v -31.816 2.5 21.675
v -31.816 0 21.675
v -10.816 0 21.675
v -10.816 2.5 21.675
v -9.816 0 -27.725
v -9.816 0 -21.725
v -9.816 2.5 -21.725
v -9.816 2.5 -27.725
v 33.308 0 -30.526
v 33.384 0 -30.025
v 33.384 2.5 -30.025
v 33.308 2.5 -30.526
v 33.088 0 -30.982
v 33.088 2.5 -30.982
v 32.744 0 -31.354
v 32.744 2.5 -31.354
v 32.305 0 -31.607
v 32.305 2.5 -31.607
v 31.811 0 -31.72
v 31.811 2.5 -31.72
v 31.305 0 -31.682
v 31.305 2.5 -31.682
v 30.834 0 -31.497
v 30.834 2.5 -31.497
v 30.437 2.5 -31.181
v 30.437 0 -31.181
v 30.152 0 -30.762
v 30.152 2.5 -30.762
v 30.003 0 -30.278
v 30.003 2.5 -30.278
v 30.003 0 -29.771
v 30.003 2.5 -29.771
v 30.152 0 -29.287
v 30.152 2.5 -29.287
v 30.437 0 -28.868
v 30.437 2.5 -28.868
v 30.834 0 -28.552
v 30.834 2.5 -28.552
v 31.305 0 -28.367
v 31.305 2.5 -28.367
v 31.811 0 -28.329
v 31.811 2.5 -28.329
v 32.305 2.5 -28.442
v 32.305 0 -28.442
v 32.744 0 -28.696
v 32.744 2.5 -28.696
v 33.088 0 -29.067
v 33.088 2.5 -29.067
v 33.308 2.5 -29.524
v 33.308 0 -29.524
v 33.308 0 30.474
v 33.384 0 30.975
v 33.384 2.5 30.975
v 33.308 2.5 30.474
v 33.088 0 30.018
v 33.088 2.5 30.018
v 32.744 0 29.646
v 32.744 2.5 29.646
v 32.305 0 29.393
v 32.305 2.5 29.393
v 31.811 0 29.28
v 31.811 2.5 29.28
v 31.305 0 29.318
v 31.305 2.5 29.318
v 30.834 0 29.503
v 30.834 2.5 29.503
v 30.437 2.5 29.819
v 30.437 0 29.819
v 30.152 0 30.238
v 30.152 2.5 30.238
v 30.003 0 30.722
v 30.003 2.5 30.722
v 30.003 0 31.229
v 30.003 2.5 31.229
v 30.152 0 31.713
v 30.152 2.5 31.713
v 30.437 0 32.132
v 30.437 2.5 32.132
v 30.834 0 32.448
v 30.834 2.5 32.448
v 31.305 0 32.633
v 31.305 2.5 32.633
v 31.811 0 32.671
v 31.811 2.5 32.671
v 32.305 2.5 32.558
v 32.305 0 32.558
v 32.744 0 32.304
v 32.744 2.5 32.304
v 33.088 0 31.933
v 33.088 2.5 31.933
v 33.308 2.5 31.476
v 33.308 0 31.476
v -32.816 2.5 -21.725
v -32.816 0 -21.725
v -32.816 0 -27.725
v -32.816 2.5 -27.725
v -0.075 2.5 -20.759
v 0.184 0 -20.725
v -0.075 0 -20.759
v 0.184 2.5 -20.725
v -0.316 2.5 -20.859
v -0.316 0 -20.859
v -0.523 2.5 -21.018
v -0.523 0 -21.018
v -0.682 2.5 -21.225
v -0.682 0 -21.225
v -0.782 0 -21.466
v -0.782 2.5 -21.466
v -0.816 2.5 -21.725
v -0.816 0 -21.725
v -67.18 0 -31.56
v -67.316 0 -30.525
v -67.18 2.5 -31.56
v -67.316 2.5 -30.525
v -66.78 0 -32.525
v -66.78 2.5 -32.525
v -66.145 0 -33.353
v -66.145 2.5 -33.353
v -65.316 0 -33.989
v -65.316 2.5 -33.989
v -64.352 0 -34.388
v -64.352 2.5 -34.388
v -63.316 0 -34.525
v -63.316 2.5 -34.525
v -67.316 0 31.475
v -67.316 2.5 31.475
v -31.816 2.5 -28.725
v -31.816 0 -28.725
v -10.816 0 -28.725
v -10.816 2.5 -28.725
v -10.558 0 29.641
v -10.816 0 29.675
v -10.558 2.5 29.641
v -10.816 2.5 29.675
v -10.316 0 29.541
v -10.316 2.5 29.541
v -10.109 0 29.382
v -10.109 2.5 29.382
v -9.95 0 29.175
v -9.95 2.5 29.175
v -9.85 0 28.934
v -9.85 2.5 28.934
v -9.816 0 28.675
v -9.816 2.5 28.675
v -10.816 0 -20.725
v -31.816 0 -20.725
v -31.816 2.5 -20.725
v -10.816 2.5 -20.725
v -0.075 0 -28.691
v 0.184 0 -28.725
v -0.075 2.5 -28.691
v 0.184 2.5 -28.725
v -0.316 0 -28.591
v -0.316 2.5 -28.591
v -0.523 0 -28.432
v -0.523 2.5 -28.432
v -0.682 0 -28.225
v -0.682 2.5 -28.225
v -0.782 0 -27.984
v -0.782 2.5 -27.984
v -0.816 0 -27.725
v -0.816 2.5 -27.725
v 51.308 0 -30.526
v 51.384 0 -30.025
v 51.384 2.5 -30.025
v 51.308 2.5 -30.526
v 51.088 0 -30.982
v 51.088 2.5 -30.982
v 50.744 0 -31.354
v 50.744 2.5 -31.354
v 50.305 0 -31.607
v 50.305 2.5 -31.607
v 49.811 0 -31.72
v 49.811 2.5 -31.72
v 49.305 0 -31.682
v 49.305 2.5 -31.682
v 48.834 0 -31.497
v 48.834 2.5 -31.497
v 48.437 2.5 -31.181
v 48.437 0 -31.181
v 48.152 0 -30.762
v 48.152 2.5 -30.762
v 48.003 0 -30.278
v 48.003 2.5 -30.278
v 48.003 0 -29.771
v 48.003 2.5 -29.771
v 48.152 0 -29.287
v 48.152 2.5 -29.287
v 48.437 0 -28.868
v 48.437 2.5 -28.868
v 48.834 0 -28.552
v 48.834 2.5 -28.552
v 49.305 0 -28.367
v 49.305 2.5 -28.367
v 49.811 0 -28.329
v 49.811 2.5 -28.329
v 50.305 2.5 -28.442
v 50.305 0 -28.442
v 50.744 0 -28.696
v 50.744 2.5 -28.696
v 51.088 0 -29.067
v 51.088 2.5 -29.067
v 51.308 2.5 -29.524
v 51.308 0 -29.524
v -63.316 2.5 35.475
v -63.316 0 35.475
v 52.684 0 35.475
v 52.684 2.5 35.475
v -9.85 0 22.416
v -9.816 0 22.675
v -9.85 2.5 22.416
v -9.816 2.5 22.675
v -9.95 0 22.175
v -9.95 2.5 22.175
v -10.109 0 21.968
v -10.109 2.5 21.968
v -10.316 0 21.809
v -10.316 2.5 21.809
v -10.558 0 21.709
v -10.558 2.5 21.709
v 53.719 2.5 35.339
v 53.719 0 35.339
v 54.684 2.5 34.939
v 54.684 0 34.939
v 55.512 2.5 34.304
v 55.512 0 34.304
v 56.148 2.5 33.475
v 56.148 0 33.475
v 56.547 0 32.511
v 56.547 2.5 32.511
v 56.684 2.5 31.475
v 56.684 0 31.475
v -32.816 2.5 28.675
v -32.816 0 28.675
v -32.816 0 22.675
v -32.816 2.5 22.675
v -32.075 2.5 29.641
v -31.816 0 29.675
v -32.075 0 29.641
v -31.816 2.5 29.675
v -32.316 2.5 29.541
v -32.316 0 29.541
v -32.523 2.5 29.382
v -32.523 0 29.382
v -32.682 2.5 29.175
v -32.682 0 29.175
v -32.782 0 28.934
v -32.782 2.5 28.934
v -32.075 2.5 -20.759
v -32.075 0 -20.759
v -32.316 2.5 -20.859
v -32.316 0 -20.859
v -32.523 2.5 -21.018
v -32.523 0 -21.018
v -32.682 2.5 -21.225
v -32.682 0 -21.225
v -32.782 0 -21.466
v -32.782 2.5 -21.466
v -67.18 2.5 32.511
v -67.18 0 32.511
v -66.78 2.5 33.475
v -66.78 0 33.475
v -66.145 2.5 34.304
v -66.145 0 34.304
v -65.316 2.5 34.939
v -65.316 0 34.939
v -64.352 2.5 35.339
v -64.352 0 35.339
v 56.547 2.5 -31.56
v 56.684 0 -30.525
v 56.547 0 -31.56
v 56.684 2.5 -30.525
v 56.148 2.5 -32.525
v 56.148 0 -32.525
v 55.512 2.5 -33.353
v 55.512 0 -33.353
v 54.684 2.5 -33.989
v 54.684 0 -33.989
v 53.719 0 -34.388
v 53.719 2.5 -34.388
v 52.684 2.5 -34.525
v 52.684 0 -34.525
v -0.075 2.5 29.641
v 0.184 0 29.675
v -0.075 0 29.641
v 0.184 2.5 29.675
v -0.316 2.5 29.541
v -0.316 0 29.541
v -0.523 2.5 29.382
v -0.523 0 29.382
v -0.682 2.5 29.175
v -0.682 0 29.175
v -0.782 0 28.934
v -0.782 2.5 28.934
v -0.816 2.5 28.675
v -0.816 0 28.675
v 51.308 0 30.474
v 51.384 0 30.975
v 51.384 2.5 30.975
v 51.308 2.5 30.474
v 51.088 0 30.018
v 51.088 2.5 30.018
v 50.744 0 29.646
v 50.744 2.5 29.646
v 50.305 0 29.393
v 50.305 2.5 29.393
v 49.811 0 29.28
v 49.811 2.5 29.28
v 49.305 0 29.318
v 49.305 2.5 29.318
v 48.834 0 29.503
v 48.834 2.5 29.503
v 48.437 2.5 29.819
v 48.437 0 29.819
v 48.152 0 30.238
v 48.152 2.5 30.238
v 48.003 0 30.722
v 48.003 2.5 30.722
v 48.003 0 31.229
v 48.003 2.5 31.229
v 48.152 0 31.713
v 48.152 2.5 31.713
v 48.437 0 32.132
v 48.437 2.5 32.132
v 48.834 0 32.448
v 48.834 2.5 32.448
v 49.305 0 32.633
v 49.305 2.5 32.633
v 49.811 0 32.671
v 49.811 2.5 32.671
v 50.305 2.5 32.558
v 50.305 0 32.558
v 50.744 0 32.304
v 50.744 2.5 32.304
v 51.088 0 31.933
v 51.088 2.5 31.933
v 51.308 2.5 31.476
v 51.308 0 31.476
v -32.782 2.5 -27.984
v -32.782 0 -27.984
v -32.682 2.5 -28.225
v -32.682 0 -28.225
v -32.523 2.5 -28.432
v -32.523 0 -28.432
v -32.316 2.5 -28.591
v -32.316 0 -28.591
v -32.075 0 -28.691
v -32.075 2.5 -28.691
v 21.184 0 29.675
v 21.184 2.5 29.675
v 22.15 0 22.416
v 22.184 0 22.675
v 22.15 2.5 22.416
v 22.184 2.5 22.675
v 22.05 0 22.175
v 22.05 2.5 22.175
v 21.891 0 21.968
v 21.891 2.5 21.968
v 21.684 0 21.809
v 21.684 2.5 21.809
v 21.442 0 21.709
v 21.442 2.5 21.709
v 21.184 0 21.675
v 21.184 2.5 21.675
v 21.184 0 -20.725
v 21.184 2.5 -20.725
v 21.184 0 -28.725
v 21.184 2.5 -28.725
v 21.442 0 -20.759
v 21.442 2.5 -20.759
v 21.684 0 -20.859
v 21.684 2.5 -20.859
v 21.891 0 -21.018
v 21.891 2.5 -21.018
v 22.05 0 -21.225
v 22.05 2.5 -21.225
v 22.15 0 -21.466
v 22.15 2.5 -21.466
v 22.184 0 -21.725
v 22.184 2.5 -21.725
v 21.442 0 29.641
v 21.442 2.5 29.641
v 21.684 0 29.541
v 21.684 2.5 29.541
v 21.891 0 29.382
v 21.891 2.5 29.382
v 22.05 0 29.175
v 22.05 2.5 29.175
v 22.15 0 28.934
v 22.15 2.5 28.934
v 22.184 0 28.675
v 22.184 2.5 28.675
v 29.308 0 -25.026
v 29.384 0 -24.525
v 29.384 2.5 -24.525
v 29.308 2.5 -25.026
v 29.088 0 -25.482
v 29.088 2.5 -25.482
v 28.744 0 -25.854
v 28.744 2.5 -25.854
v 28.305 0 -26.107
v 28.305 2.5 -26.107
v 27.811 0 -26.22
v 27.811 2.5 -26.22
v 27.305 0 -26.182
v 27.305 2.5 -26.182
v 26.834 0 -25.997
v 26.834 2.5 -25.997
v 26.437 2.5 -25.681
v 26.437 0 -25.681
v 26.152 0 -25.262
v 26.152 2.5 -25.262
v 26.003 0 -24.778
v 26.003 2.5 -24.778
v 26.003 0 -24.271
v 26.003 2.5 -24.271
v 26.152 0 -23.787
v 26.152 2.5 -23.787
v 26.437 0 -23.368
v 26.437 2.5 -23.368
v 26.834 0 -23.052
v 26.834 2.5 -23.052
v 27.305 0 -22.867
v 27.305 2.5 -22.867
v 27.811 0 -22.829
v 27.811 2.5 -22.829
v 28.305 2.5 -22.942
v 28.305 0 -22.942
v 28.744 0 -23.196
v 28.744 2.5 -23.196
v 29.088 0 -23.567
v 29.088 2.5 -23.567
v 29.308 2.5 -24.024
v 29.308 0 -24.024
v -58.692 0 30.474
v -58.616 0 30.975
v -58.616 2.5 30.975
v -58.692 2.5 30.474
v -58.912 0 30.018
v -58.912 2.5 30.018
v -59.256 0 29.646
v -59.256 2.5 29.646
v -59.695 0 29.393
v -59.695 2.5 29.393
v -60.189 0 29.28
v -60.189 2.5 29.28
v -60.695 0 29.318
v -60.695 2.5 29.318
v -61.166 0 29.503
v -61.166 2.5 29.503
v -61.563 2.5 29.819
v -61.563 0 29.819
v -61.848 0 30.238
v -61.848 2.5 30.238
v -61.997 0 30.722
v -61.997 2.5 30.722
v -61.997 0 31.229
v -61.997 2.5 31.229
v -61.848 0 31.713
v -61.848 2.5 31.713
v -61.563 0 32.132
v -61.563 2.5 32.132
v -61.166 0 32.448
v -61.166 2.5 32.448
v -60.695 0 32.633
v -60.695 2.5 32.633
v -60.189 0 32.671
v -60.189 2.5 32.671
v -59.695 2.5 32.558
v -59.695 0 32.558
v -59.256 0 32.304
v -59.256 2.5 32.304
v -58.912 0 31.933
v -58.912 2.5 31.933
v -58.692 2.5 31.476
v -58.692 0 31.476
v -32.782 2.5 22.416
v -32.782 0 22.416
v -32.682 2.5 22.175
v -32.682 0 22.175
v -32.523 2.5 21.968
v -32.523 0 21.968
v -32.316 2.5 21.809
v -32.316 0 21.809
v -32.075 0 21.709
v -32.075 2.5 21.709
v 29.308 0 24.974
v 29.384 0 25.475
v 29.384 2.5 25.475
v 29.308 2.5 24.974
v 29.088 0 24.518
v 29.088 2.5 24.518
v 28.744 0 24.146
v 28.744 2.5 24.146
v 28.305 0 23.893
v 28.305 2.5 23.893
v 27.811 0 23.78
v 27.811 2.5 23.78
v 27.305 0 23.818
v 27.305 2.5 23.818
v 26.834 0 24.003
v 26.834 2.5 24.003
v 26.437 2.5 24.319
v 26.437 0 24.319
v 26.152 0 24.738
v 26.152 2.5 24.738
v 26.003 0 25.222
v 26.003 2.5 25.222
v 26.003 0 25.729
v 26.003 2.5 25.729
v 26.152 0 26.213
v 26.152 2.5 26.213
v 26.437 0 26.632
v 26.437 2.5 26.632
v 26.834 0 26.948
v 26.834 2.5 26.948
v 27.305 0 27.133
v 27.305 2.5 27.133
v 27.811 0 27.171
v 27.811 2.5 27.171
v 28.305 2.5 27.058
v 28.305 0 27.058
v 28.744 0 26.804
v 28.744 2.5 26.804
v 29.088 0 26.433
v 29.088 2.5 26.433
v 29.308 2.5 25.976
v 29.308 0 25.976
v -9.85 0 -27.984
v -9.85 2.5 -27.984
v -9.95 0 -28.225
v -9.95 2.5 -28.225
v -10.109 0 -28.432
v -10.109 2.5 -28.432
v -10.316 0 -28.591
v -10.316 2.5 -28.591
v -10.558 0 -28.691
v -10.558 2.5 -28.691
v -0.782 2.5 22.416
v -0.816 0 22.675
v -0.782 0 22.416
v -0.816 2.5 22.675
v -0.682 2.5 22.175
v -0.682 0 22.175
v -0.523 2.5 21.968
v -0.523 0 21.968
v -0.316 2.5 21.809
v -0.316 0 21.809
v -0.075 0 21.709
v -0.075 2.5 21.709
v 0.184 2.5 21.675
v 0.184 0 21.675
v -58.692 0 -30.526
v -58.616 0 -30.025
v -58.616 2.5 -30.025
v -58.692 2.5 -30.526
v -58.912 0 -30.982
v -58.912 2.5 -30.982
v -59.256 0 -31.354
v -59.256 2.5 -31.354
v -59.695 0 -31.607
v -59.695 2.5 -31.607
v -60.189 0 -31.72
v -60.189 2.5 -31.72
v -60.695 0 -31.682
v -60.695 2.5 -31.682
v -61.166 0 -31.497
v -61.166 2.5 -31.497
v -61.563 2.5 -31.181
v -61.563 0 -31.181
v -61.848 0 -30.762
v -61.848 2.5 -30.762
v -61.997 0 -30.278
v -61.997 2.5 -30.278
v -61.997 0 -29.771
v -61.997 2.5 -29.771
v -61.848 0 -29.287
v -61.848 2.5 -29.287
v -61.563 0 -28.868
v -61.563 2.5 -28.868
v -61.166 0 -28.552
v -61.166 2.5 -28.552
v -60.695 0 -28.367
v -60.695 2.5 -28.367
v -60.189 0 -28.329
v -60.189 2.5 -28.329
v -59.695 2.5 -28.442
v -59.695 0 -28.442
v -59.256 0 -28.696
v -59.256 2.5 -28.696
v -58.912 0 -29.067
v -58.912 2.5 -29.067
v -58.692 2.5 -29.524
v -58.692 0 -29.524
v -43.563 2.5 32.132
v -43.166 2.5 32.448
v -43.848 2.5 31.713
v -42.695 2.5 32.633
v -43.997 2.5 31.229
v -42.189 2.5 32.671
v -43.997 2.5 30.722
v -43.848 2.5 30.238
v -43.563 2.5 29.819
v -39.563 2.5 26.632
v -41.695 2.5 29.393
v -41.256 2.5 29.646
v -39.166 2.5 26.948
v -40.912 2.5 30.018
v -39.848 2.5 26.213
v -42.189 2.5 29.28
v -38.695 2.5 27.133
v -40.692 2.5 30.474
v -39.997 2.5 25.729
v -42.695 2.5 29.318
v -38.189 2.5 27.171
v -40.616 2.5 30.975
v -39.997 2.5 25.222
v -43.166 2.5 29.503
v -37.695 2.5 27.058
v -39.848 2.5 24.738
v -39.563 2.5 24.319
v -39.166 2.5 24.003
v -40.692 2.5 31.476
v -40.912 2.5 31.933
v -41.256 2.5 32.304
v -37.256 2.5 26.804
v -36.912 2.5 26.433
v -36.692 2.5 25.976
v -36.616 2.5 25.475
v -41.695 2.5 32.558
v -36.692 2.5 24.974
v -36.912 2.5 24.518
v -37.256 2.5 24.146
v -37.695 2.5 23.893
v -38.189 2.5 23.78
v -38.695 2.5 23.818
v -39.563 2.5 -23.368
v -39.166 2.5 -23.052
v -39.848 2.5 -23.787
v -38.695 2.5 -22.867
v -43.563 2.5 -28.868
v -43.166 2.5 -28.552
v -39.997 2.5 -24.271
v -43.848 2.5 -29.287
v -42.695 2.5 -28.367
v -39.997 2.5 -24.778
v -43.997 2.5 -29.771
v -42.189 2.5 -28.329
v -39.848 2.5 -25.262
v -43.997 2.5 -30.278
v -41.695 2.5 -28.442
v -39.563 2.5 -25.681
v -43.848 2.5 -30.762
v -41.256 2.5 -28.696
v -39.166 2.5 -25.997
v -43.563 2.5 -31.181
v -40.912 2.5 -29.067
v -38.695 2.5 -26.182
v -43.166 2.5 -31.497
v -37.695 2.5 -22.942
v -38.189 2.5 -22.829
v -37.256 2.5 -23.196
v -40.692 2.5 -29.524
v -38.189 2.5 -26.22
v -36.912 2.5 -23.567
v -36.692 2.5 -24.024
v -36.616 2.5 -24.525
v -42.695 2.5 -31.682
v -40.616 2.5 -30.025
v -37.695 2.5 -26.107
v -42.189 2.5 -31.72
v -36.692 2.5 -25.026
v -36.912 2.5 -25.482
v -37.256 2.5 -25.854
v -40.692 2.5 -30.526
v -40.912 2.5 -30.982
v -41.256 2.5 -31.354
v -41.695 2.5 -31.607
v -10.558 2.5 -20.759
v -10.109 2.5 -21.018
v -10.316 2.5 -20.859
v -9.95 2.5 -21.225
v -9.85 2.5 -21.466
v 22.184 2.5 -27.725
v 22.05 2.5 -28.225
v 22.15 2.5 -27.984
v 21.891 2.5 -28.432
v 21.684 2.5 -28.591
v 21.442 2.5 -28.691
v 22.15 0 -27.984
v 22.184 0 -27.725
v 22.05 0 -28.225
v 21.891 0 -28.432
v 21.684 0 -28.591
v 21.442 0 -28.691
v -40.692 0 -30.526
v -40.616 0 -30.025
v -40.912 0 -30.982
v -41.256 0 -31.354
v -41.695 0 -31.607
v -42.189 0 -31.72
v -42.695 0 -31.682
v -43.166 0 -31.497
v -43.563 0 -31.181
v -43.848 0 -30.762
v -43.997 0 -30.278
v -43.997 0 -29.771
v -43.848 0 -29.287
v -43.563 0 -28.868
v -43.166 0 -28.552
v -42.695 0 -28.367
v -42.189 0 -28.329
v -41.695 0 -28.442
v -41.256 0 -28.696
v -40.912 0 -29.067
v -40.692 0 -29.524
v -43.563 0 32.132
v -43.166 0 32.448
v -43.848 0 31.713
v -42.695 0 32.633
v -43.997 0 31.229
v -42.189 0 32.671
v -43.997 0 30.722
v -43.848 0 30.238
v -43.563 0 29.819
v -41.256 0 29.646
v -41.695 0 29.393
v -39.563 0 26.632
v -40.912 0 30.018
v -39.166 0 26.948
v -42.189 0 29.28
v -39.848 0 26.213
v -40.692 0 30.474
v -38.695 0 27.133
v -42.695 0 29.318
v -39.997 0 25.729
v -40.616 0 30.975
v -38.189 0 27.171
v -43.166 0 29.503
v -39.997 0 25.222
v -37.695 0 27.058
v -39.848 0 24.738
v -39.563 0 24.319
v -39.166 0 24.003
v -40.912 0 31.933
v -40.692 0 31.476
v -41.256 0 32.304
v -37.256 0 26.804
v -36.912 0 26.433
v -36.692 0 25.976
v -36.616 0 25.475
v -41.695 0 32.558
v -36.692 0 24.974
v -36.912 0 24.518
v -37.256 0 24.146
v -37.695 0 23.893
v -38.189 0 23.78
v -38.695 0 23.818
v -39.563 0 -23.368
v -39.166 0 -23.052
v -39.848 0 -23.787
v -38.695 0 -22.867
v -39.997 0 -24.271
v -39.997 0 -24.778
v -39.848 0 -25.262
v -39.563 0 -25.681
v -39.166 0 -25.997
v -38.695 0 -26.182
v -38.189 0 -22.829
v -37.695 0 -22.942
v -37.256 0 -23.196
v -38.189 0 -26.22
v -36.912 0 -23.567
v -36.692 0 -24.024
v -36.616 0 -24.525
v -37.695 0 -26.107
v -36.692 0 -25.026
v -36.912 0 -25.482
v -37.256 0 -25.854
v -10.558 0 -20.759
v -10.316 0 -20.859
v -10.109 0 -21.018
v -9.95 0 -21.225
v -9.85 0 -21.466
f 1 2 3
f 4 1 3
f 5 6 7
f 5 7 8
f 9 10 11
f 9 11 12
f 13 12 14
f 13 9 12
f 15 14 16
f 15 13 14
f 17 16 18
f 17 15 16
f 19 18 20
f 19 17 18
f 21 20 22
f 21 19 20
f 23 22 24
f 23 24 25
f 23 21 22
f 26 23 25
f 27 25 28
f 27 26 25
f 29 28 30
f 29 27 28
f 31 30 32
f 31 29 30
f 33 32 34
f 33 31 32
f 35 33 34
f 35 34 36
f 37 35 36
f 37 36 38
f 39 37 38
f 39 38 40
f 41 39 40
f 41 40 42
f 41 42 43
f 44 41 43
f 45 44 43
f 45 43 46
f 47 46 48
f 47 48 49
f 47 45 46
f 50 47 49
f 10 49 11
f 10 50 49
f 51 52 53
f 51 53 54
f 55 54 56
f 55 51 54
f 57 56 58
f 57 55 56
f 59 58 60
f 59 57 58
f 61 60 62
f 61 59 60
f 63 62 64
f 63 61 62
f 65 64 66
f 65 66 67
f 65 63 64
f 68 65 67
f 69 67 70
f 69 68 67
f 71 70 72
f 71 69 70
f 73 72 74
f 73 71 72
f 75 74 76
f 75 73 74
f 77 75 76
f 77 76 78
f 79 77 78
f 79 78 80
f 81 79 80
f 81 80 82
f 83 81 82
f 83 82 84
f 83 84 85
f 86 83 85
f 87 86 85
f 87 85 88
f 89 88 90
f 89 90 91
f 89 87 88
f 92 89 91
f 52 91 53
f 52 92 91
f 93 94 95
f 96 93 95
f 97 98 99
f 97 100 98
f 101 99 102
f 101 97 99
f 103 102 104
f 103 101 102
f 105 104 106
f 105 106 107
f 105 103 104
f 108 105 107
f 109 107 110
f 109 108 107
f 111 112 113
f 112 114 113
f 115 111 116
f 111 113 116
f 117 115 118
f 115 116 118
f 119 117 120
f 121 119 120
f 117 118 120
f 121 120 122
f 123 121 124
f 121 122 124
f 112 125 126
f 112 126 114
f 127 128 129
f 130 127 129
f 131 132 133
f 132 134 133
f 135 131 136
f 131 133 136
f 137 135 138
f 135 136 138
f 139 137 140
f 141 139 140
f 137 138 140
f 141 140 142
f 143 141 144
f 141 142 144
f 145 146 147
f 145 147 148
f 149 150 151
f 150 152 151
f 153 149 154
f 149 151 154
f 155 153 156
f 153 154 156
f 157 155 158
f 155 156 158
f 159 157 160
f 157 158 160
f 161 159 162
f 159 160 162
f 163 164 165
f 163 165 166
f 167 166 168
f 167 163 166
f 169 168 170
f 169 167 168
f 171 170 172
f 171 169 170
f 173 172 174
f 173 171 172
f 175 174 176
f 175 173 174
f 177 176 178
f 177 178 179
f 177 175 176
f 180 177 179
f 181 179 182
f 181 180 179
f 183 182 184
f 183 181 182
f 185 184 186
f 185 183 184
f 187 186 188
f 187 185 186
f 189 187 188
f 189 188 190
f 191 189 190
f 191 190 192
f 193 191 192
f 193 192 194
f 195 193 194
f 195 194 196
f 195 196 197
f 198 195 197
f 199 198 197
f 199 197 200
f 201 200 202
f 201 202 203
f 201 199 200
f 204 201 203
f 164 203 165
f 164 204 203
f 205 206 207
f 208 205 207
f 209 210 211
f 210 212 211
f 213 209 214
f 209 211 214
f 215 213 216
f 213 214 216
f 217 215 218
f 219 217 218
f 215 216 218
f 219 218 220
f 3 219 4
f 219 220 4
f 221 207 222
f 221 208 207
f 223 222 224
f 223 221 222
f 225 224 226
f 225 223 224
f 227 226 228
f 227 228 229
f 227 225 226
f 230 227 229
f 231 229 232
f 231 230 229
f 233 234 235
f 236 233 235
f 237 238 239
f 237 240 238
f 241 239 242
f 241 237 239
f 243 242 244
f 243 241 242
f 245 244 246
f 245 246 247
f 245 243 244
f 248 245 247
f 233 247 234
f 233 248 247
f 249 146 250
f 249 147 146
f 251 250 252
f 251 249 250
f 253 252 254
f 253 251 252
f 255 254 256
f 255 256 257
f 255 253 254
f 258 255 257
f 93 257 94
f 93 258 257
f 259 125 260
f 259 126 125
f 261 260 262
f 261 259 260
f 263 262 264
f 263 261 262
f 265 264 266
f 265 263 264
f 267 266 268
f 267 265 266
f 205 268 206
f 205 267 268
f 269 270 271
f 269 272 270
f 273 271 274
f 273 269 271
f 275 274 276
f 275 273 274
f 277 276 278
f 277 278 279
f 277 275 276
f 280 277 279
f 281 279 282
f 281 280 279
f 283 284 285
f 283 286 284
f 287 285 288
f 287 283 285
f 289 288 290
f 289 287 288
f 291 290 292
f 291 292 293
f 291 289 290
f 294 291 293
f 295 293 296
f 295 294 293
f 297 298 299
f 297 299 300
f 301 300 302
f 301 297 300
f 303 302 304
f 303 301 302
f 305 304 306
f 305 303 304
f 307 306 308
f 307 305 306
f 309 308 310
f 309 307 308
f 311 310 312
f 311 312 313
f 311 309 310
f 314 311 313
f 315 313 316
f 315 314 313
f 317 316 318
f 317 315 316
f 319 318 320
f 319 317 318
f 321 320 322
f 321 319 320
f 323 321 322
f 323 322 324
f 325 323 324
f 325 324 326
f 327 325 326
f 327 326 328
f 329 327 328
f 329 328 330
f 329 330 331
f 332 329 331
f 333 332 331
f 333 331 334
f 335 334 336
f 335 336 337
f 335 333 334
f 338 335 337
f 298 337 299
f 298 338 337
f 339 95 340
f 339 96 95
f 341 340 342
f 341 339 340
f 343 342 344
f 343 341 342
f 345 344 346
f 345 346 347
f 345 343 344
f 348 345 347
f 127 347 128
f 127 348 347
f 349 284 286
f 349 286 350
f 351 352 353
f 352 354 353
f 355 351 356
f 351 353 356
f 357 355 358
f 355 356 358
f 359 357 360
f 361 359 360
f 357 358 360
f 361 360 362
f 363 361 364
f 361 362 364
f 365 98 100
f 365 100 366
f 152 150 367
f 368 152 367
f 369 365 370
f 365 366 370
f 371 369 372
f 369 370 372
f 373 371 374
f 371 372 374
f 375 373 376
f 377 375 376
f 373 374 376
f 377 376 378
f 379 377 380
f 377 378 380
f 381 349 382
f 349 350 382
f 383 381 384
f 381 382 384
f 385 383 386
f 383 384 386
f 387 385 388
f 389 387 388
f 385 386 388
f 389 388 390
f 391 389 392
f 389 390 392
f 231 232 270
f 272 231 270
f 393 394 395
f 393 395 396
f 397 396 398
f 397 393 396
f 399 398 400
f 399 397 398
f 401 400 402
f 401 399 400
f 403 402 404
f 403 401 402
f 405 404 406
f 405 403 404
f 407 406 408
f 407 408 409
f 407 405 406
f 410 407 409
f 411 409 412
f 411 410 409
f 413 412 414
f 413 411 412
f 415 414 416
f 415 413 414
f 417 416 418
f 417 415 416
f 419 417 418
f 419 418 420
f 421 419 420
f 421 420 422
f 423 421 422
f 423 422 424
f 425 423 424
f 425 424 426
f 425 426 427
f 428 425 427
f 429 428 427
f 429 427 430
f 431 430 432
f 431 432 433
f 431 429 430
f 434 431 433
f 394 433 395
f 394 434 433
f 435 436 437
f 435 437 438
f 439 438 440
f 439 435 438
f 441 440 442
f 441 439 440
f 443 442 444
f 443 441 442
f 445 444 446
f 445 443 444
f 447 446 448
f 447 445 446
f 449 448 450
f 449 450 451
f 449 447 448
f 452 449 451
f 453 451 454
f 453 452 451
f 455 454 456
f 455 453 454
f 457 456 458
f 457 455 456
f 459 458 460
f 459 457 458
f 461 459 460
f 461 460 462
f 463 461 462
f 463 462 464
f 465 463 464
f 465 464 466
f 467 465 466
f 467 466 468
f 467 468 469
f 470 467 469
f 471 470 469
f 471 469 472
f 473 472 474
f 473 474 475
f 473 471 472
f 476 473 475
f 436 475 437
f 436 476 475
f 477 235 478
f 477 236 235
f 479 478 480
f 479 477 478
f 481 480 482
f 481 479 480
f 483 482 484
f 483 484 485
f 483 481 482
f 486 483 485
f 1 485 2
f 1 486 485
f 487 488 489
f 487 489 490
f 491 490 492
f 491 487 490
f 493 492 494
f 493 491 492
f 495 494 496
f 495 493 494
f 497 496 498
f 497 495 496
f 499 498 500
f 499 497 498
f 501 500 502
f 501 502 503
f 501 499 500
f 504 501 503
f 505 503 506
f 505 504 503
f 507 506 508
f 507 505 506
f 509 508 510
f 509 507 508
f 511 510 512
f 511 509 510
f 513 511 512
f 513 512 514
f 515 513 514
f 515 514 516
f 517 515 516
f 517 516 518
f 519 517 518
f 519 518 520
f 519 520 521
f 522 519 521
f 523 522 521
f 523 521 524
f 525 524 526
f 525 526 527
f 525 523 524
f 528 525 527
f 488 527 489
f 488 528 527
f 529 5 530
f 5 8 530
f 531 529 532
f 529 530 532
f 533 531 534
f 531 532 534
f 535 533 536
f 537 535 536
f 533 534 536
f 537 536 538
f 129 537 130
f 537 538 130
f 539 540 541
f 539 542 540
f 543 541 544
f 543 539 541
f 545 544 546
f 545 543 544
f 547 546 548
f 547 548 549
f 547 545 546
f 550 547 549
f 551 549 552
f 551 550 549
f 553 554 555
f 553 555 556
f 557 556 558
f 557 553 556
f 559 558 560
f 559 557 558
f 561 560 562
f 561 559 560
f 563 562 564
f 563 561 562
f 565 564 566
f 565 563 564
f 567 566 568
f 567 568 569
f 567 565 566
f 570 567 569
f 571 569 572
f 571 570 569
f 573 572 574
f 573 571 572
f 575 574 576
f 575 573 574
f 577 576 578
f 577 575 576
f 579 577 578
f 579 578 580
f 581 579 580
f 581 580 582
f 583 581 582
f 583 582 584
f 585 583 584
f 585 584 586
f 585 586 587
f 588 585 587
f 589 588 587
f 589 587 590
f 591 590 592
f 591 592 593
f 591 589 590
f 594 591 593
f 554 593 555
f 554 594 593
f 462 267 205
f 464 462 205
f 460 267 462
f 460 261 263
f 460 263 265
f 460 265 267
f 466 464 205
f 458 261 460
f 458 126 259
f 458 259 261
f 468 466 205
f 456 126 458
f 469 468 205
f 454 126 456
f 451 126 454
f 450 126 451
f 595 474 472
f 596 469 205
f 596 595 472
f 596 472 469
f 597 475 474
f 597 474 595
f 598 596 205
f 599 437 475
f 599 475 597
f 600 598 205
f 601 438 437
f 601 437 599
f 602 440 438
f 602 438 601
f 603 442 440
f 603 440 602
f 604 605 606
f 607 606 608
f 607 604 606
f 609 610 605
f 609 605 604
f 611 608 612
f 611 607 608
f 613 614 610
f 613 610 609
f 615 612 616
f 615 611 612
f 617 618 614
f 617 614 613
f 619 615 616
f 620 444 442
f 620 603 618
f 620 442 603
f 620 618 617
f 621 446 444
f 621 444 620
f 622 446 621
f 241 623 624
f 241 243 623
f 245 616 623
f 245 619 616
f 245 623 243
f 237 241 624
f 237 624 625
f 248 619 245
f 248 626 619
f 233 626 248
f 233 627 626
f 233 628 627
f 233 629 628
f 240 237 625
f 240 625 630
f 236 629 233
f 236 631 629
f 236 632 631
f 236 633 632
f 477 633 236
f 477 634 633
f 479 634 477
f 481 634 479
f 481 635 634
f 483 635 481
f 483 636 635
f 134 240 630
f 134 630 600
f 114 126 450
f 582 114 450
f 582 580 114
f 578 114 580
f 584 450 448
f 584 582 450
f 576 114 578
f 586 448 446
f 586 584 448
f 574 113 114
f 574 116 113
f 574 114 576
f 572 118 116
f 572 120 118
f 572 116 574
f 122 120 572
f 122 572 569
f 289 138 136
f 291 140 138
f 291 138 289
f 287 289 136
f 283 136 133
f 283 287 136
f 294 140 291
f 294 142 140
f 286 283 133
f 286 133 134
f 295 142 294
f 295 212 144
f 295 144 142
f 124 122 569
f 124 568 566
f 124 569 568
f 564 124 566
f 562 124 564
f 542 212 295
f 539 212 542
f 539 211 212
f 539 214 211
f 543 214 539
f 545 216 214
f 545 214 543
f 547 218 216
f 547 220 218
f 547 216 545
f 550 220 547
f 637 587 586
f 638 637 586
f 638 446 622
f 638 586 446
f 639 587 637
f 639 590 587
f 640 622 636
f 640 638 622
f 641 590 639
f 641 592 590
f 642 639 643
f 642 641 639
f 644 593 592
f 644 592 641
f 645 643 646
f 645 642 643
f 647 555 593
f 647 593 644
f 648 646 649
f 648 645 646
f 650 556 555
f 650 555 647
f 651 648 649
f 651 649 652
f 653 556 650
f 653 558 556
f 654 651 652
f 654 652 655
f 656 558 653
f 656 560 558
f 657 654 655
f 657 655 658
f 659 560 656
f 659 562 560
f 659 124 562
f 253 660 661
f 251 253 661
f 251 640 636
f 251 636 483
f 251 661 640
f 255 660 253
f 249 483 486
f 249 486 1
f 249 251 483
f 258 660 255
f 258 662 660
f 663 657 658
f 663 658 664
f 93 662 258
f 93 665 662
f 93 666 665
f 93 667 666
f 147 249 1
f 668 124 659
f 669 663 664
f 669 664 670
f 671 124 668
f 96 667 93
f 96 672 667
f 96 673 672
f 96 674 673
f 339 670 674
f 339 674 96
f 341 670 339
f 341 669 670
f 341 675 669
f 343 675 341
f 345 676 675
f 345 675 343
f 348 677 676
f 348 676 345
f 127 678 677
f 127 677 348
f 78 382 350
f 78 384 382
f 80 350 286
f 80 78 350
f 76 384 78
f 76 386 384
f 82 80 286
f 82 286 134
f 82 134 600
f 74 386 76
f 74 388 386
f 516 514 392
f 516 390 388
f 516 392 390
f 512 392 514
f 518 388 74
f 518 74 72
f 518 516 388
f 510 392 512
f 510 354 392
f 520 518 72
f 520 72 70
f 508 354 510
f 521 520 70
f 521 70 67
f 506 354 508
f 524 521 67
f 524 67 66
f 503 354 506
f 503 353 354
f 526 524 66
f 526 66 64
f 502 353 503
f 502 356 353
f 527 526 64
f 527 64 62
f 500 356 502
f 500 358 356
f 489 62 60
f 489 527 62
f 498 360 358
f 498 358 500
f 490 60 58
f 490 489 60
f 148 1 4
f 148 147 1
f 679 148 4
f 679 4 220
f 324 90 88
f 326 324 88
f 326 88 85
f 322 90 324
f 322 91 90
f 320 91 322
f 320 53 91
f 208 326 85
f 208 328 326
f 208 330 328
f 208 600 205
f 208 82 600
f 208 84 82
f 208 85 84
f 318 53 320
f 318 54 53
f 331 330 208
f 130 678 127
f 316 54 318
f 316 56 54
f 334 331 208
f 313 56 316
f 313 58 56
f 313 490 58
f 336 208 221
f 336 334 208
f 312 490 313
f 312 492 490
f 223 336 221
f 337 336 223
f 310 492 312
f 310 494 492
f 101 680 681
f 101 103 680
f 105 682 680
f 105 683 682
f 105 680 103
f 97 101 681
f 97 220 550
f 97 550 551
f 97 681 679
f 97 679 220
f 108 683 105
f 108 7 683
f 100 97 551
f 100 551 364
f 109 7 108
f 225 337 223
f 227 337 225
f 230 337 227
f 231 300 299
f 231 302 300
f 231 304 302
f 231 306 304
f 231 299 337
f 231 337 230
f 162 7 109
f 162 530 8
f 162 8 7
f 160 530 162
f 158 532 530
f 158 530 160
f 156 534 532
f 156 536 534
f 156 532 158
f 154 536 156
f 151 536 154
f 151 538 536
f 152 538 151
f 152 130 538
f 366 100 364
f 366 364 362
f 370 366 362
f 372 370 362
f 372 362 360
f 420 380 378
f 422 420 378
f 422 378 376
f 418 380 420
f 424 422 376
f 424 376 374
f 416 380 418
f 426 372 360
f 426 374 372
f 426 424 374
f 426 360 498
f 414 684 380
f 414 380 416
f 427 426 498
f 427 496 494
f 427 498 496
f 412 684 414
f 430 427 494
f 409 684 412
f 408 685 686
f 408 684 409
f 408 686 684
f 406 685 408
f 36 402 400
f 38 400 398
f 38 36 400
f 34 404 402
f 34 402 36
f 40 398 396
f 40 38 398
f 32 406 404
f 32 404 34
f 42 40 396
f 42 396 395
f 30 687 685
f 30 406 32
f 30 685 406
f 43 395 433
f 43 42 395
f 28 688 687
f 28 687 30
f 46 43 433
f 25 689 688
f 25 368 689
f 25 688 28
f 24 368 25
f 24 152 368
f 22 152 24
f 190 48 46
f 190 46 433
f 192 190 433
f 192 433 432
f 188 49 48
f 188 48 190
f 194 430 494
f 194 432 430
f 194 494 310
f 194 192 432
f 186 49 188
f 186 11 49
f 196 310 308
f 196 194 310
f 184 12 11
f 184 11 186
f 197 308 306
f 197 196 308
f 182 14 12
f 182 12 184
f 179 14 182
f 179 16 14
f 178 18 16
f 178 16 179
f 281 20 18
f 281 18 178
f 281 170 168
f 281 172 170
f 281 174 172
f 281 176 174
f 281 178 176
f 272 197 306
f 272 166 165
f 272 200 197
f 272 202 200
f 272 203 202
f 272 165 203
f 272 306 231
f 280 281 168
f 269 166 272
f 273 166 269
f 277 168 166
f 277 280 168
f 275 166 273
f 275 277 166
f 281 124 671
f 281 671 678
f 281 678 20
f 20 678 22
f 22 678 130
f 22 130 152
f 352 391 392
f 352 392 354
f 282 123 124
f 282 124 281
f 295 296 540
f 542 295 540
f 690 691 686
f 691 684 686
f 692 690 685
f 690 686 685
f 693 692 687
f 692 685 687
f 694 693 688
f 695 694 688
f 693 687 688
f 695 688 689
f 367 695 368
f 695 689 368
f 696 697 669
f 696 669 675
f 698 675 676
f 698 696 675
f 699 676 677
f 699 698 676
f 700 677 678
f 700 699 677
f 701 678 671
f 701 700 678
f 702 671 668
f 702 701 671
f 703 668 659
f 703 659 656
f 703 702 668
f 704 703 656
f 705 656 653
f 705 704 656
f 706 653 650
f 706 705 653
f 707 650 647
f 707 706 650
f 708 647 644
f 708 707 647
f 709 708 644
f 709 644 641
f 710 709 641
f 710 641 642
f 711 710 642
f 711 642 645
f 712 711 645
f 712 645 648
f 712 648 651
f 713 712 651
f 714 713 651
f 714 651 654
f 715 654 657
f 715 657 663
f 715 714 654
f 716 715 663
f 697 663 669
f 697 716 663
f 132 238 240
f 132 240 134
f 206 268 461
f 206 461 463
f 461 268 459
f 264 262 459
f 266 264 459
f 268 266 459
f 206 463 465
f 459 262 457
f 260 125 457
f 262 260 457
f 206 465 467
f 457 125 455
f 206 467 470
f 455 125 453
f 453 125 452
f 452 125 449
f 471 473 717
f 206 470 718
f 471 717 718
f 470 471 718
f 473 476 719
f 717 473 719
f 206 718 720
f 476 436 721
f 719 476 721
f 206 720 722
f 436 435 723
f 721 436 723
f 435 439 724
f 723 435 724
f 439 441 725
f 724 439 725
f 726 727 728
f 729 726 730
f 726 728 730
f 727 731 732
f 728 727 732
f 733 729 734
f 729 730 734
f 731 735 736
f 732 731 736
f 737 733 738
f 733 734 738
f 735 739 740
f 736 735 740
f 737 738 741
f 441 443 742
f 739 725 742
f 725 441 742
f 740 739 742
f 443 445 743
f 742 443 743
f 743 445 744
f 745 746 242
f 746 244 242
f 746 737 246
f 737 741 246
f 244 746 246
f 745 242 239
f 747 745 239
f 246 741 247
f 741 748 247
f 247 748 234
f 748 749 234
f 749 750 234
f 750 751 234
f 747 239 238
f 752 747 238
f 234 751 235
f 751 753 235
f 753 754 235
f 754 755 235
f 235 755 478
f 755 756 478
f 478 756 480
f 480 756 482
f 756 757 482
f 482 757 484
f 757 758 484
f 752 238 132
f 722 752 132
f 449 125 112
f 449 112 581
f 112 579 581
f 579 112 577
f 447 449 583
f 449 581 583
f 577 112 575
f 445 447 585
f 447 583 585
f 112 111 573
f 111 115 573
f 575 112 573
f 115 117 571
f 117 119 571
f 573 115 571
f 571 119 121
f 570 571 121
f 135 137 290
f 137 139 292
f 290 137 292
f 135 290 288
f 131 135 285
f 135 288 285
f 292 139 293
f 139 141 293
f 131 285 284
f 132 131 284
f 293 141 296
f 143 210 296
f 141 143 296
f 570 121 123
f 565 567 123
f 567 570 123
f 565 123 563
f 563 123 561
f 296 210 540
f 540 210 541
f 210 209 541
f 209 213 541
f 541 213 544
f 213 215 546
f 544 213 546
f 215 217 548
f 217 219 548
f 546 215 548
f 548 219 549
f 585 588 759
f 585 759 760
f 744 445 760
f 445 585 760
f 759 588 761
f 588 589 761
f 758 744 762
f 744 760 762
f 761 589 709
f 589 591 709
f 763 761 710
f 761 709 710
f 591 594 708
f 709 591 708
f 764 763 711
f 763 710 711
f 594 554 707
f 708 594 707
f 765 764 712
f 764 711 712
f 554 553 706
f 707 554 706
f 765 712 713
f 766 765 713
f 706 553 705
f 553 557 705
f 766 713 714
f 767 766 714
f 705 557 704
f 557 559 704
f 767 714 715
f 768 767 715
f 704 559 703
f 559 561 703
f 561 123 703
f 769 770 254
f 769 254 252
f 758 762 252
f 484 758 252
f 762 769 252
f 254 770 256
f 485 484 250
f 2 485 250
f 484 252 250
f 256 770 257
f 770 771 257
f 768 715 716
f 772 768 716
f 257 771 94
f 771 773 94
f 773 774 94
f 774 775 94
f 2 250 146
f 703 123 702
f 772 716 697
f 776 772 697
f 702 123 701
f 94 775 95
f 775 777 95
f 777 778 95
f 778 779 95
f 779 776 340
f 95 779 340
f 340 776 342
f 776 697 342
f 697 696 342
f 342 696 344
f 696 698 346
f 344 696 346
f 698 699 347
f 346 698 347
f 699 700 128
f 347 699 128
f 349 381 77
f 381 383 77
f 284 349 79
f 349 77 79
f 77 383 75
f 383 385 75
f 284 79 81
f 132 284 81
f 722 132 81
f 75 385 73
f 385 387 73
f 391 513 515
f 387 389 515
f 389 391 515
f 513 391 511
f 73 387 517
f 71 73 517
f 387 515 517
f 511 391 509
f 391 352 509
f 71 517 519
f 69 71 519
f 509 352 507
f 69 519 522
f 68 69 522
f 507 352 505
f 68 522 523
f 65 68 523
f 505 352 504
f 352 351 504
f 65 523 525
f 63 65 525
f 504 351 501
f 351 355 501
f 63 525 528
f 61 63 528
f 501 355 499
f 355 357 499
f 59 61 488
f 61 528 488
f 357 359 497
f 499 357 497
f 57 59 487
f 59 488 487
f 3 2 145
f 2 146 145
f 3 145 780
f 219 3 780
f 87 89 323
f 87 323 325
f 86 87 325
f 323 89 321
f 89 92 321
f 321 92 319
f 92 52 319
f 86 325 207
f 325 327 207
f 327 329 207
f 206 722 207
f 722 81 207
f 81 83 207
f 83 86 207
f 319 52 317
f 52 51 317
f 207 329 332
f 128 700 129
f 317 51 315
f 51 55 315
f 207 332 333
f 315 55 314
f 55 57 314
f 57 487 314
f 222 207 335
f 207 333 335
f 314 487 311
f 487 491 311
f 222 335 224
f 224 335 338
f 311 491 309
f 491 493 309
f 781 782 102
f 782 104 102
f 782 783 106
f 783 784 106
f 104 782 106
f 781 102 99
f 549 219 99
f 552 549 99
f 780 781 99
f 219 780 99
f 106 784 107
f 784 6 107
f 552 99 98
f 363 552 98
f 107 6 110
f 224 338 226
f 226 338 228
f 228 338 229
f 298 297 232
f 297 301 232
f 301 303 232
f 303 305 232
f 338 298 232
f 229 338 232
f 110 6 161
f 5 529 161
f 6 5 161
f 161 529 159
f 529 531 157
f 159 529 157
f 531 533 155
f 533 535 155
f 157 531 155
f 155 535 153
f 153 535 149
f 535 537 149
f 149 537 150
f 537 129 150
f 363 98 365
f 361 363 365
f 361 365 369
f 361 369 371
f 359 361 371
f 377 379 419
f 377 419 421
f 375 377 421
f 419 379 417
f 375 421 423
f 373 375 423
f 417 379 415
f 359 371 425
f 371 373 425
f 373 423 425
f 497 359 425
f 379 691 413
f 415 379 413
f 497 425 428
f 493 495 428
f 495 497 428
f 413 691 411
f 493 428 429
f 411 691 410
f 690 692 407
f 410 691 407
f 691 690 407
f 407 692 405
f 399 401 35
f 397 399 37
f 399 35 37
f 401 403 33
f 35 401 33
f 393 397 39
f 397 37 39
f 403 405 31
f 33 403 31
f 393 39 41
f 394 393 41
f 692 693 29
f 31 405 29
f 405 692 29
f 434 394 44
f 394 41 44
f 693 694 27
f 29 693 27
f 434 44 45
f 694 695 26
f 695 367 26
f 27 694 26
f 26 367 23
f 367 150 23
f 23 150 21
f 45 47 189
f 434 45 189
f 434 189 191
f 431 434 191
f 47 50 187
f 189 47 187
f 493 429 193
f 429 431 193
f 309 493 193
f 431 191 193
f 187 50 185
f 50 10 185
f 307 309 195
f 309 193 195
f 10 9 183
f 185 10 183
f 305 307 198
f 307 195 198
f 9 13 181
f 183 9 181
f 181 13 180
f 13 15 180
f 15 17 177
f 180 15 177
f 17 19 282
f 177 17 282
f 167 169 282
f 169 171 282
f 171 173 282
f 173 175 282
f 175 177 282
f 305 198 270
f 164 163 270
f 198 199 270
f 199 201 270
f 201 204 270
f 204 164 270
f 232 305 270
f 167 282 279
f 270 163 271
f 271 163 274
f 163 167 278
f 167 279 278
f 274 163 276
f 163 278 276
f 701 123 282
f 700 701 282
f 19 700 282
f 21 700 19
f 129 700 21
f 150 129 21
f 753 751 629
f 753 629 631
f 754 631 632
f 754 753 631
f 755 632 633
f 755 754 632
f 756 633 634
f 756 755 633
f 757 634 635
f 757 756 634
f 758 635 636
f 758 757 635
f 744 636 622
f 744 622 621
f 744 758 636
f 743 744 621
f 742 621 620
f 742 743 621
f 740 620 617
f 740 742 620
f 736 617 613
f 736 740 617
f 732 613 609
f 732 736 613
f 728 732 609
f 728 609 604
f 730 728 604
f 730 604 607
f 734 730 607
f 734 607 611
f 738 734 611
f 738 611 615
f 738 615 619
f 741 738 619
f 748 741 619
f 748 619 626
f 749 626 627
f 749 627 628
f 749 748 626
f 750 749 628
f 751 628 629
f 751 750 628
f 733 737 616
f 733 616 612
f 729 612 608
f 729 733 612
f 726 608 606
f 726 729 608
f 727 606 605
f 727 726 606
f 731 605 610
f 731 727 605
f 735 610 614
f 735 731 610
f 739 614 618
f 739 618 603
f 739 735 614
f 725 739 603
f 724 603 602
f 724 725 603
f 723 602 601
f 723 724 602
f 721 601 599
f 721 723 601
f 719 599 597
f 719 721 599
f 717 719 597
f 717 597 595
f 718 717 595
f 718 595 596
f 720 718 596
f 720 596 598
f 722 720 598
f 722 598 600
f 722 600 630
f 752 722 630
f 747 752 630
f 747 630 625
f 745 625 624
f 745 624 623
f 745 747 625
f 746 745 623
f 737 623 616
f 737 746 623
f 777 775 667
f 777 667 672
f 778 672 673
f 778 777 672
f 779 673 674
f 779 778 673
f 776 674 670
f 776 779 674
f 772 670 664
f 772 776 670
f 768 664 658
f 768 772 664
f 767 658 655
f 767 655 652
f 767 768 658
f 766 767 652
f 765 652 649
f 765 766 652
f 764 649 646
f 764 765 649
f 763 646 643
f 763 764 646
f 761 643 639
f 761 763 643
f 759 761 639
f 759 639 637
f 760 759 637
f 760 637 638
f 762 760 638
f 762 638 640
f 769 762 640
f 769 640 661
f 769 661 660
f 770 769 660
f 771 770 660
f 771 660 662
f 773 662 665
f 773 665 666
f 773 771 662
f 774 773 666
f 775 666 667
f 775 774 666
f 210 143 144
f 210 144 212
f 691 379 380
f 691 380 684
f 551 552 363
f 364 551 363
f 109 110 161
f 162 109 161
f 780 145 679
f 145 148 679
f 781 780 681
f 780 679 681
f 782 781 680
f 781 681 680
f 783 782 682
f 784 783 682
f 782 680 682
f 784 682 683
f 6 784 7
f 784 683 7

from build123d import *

# Parameters (mm, degrees)
SKETCH_1_W      = 124
SKETCH_1_H      = 70
SKETCH_1_R      = 1.7
SKETCH_1_W_2    = 23
SKETCH_1_H_2    = 8
EXTRUDE_1_DEPTH = 2.5
FILLET_1_R      = 4
FILLET_2_R      = 4
FILLET_3_R      = 4
FILLET_4_R      = 4
FILLET_6_R      = 1
FILLET_8_R      = 1
FILLET_9_R      = 1


with BuildPart() as part:
    # 草图1 → 凸台-拉伸1 (new body)
    with BuildSketch(Plane(origin=(0, 0, 0), x_dir=(1, 0, 0), z_dir=(0, 1, 0))):
        with Locations((-5.316321244, -0.475281048)):
            Rectangle(SKETCH_1_W, SKETCH_1_H)
        with Locations((49.683678756, -30.975281048)):
            Circle(SKETCH_1_R, mode=Mode.SUBTRACT)
        with Locations((49.683678756, 30.024718952)):
            Circle(SKETCH_1_R, mode=Mode.SUBTRACT)
        with Locations((-60.316321244, 30.024718952)):
            Circle(SKETCH_1_R, mode=Mode.SUBTRACT)
        with Locations((-60.316321244, -30.975281048)):
            Circle(SKETCH_1_R, mode=Mode.SUBTRACT)
        with Locations((-42.316321244, -30.975281048)):
            Circle(SKETCH_1_R, mode=Mode.SUBTRACT)
        with Locations((-38.316321244, -25.475281048)):
            Circle(SKETCH_1_R, mode=Mode.SUBTRACT)
        with Locations((31.683678756, -30.975281048)):
            Circle(SKETCH_1_R, mode=Mode.SUBTRACT)
        with Locations((27.683678756, -25.475281048)):
            Circle(SKETCH_1_R, mode=Mode.SUBTRACT)
        with Locations((31.683678756, 30.024718952)):
            Circle(SKETCH_1_R, mode=Mode.SUBTRACT)
        with Locations((27.683678756, 24.524718952)):
            Circle(SKETCH_1_R, mode=Mode.SUBTRACT)
        with Locations((-42.316321244, 30.024718952)):
            Circle(SKETCH_1_R, mode=Mode.SUBTRACT)
        with Locations((-38.316321244, 24.524718952)):
            Circle(SKETCH_1_R, mode=Mode.SUBTRACT)
        with Locations((10.683678756, -25.675281048)):
            Rectangle(SKETCH_1_W_2, SKETCH_1_H_2, mode=Mode.SUBTRACT)
        with Locations((-21.316321244, -25.675281048)):
            Rectangle(SKETCH_1_W_2, SKETCH_1_H_2, mode=Mode.SUBTRACT)
        with Locations((-21.316321244, 24.724718952)):
            Rectangle(SKETCH_1_W_2, SKETCH_1_H_2, mode=Mode.SUBTRACT)
        with Locations((10.683678756, 24.724718952)):
            Rectangle(SKETCH_1_W_2, SKETCH_1_H_2, mode=Mode.SUBTRACT)
    extrude(amount=EXTRUDE_1_DEPTH)

    # 圆角1
    fillet_1_edges = [part.edges().sort_by_distance(p)[0] for p in [
        (-67.316321244, 1.25, 35.475281048),
    ]]
    fillet(fillet_1_edges, radius=FILLET_1_R)

    # 圆角2
    fillet_2_edges = [part.edges().sort_by_distance(p)[0] for p in [
        (-67.316321244, 1.25, -34.524718952),
    ]]
    fillet(fillet_2_edges, radius=FILLET_2_R)

    # 圆角3
    fillet_3_edges = [part.edges().sort_by_distance(p)[0] for p in [
        (56.683678756, 1.25, 35.475281048),
    ]]
    fillet(fillet_3_edges, radius=FILLET_3_R)

    # 圆角4
    fillet_4_edges = [part.edges().sort_by_distance(p)[0] for p in [
        (56.683678756, 1.25, -34.524718952),
    ]]
    fillet(fillet_4_edges, radius=FILLET_4_R)

    # 圆角6
    fillet_6_edges = [part.edges().sort_by_distance(p)[0] for p in [
        (-0.816321244, 1.25, -28.724718952),
        (-0.816321244, 1.25, -20.724718952),
        (22.183678756, 1.25, -20.724718952),
        (22.183678756, 1.25, -28.724718952),
    ]]
    fillet(fillet_6_edges, radius=FILLET_6_R)

    # 圆角8
    fillet_8_edges = [part.edges().sort_by_distance(p)[0] for p in [
        (-32.816321244, 1.25, -28.724718952),
        (-32.816321244, 1.25, -20.724718952),
        (-9.816321244, 1.25, -20.724718952),
        (-9.816321244, 1.25, -28.724718952),
    ]]
    fillet(fillet_8_edges, radius=FILLET_8_R)

    # 圆角9
    fillet_9_edges = [part.edges().sort_by_distance(p)[0] for p in [
        (-32.816321244, 1.25, 21.675281048),
        (-32.816321244, 1.25, 29.675281048),
        (-9.816321244, 1.25, 29.675281048),
        (-9.816321244, 1.25, 21.675281048),
        (-0.816321244, 1.25, 21.675281048),
        (-0.816321244, 1.25, 29.675281048),
        (22.183678756, 1.25, 29.675281048),
        (22.183678756, 1.25, 21.675281048),
    ]]
    fillet(fillet_9_edges, radius=FILLET_9_R)


solid = part.part
